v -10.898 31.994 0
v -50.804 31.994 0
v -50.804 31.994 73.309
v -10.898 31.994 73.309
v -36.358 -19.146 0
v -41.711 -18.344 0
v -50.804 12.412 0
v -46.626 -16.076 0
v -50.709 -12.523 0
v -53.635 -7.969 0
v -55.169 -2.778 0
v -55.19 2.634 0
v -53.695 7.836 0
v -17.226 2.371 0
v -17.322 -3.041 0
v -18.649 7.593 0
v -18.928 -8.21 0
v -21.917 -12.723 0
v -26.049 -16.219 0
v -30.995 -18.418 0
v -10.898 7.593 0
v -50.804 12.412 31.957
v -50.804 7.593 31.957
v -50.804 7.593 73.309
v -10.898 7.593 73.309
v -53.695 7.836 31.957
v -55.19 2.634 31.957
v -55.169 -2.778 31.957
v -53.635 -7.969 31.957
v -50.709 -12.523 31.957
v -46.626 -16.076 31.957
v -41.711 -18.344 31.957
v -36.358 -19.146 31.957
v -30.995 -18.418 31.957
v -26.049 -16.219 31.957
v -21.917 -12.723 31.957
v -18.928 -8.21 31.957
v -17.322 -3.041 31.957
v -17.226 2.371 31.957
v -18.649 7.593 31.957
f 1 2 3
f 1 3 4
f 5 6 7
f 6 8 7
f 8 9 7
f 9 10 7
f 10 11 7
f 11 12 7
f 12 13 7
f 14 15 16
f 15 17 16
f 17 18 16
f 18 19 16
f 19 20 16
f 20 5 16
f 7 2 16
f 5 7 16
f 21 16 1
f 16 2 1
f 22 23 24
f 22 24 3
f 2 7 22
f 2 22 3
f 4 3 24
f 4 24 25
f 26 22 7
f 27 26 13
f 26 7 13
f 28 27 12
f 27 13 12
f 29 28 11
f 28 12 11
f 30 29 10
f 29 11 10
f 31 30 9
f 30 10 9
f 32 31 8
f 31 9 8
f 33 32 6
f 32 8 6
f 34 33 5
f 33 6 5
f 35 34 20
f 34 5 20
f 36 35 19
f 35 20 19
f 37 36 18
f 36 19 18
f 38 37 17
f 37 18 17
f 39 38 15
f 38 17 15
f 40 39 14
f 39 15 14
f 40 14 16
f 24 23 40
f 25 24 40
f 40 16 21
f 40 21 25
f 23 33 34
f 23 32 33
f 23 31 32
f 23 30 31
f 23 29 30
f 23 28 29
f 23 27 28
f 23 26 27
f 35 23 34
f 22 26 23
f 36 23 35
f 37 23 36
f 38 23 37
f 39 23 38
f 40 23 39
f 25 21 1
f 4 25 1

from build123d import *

# Parameters (mm, degrees)
F0_R     = 19.146623
F1_DEPTH = 31.956613
F2_W     = 39.905567
F2_H     = 24.400435
F3_DEPTH = 73.309049


with BuildPart() as f1:
    # F0 (on Top) → F1 (new body)
    with BuildSketch(Plane.XY):
        with Locations((-36.225423, 0)):
            Circle(F0_R)
    extrude(amount=F1_DEPTH)

    # F2 (on Top) → F3 (join)
    with BuildSketch(Plane.XY):
        with Locations((-30.850997, 19.793321)):
            Rectangle(F2_W, F2_H)
    extrude(amount=F3_DEPTH)


solid = f1.part
